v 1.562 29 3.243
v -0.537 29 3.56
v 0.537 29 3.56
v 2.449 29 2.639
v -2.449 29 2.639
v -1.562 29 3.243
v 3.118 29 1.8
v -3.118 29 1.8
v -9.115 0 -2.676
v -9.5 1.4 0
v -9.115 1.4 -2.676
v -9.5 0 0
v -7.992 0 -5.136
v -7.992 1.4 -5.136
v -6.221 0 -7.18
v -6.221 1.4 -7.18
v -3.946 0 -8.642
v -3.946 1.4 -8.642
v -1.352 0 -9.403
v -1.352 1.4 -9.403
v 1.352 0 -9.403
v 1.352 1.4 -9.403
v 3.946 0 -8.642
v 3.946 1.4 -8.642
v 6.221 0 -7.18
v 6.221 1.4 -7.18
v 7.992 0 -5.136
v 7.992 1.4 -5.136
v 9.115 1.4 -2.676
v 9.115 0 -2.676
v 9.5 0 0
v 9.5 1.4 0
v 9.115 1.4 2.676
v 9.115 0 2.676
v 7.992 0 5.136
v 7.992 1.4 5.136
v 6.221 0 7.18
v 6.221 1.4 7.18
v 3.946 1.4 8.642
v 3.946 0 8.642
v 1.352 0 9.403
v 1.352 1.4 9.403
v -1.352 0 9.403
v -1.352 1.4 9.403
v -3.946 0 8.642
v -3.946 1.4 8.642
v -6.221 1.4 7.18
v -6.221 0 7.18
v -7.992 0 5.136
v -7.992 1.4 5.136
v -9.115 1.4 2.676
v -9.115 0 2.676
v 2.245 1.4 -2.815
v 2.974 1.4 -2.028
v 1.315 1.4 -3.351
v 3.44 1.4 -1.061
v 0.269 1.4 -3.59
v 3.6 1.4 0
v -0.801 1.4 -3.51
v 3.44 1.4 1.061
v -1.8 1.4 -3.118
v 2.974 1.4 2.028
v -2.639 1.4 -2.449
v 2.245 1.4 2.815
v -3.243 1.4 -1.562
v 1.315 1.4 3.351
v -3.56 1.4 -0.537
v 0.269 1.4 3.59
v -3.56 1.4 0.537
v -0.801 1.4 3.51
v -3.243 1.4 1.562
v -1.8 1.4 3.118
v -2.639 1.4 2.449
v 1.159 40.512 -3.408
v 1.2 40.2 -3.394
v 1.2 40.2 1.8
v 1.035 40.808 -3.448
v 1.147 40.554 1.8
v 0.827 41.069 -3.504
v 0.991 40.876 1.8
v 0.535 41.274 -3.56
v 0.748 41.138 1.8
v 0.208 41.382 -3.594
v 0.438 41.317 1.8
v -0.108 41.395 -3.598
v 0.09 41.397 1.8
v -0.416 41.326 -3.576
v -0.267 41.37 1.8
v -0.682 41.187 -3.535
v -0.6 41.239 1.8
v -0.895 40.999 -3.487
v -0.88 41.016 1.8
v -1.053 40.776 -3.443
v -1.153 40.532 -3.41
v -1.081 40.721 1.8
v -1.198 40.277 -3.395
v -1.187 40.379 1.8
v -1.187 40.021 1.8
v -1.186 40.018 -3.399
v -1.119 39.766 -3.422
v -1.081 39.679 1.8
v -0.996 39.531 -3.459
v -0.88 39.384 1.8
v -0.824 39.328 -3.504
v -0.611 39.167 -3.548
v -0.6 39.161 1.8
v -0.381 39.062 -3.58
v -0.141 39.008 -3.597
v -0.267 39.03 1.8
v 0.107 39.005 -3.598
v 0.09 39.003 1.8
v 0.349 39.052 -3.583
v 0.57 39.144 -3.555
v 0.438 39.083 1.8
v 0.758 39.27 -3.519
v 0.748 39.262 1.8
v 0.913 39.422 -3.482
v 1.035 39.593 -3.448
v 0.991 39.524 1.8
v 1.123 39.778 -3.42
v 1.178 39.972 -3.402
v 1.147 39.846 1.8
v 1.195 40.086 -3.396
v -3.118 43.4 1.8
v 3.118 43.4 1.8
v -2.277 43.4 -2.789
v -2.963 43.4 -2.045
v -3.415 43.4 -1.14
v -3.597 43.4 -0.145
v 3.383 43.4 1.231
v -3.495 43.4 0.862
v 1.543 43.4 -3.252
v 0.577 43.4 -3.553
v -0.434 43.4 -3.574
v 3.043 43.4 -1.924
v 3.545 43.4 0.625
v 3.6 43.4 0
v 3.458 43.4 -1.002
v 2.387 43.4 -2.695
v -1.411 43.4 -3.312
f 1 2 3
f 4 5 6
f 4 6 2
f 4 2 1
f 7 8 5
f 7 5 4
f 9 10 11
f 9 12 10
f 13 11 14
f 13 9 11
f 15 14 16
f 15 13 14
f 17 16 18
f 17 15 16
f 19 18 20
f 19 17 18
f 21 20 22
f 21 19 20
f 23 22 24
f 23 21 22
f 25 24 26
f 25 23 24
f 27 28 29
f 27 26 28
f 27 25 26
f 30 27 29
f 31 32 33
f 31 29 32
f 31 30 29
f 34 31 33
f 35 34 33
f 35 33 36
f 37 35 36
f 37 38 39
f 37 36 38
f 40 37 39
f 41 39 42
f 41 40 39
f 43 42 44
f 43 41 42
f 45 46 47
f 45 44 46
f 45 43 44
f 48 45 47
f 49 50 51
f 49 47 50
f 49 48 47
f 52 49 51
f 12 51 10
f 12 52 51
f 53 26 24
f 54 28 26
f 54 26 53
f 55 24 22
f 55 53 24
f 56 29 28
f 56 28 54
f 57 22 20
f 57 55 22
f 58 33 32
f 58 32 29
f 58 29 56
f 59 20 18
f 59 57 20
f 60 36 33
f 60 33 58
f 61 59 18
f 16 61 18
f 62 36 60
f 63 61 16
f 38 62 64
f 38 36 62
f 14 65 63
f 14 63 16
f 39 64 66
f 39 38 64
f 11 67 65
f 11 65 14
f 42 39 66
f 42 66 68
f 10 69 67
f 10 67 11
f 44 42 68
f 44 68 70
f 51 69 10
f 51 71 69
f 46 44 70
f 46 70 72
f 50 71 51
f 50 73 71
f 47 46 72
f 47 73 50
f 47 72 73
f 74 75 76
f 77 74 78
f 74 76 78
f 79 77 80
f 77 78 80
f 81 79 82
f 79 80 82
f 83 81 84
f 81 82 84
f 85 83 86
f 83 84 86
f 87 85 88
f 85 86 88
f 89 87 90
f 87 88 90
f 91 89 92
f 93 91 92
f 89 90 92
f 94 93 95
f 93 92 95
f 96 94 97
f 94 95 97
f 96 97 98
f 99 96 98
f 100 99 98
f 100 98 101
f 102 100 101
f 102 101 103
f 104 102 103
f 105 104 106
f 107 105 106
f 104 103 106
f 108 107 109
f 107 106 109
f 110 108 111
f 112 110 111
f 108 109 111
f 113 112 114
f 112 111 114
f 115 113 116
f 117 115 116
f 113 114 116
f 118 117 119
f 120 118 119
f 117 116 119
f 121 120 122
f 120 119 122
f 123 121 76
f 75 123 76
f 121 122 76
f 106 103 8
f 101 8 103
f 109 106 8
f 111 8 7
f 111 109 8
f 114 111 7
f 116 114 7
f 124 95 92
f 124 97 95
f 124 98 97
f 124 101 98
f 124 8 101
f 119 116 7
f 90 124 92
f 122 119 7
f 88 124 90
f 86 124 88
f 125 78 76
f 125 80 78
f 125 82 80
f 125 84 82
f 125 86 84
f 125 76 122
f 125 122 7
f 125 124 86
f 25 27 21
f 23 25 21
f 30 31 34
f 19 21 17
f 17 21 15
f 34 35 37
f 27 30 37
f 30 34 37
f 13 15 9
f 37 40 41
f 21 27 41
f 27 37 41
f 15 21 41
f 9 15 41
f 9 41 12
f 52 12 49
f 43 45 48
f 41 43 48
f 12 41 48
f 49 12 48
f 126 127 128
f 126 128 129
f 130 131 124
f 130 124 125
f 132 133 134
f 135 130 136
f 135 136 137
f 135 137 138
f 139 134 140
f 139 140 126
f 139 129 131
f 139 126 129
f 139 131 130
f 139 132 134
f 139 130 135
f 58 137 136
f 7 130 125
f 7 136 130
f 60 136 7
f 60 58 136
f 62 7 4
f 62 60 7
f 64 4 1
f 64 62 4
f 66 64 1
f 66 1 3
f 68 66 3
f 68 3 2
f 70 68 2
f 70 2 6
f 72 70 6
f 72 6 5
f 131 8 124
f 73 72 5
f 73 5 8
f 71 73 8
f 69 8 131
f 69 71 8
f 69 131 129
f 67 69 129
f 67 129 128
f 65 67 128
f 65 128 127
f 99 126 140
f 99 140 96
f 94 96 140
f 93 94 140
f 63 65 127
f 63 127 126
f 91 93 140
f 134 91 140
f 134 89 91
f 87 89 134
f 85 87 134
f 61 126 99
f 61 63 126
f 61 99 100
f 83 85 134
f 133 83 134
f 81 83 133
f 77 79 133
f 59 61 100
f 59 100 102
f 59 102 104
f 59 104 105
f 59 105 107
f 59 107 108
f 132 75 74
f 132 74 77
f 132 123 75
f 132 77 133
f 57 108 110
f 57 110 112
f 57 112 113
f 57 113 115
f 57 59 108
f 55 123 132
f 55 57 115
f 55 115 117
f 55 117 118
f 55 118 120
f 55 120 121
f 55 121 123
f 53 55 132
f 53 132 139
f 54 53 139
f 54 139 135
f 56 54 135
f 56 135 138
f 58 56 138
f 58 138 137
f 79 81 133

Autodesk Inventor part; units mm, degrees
ref_plane "YZ Plane" through (0, 0, 0) normal (1, 0, 0) x (0, 1, 0)
ref_plane "XZ Plane" through (0, 0, 0) normal (0, 1, 0) x (-1, 0, 0)
ref_plane "XY Plane" through (0, 0, 0) normal (0, 0, 1) x (1, 0, 0)
sketch "Sketch1" plane through (0, 0, 0) normal (0, 1, 0) x (-1, 0, 0)
  circle A0 centre (0, 0) radius 9.5
  dimension "d0" = 19
extrude "Extrusion1" add sketch "Sketch1" along normal blind 1.4
sketch "Sketch2" plane through (0, 1.4, 0) normal (0, 1, 0) x (1, 0, 0)
  circle A0 centre (0, 0) radius 9.5 projected
  circle A1 centre (0, 0) radius 3.6
  dimension "d3" = 7.2
extrude "Extrusion2" add sketch "Sketch2" along normal blind 42 contours A1
sketch "Sketch3" plane through (0, 43.4, 0) normal (0, 1, 0) x (1, 0, 0)
  circle A0 centre (0, 0) radius 3.6 projected
  line L0 (-3.1177, -1.8) -> (3.1177, -1.8)
  arc A1 (-3.1177, -1.8) -> (3.1177, -1.8) centre (0, 0) ccw
  dimension "d6" = 1.8
extrude "Extrusion3" cut sketch "Sketch3" against normal blind 14.4 contours L0 A0 picked at (0.1393, -2.8389)
sketch "Sketch4" plane through (-3.1177, 43.4, 1.8) normal (0, 0, 1) x (1, 0, 0)
  line L0 (0, 0) -> (6.2354, 0) projected
  circle A0 centre (3.1177, -3.2) radius 1.2
  point P0 (3.1177, -43.4)
  dimension "d9" = 2.4
  dimension "d10" = 3.2
extrude "Extrusion4" cut sketch "Sketch4" against normal through all
properties part number "Front Axle"
